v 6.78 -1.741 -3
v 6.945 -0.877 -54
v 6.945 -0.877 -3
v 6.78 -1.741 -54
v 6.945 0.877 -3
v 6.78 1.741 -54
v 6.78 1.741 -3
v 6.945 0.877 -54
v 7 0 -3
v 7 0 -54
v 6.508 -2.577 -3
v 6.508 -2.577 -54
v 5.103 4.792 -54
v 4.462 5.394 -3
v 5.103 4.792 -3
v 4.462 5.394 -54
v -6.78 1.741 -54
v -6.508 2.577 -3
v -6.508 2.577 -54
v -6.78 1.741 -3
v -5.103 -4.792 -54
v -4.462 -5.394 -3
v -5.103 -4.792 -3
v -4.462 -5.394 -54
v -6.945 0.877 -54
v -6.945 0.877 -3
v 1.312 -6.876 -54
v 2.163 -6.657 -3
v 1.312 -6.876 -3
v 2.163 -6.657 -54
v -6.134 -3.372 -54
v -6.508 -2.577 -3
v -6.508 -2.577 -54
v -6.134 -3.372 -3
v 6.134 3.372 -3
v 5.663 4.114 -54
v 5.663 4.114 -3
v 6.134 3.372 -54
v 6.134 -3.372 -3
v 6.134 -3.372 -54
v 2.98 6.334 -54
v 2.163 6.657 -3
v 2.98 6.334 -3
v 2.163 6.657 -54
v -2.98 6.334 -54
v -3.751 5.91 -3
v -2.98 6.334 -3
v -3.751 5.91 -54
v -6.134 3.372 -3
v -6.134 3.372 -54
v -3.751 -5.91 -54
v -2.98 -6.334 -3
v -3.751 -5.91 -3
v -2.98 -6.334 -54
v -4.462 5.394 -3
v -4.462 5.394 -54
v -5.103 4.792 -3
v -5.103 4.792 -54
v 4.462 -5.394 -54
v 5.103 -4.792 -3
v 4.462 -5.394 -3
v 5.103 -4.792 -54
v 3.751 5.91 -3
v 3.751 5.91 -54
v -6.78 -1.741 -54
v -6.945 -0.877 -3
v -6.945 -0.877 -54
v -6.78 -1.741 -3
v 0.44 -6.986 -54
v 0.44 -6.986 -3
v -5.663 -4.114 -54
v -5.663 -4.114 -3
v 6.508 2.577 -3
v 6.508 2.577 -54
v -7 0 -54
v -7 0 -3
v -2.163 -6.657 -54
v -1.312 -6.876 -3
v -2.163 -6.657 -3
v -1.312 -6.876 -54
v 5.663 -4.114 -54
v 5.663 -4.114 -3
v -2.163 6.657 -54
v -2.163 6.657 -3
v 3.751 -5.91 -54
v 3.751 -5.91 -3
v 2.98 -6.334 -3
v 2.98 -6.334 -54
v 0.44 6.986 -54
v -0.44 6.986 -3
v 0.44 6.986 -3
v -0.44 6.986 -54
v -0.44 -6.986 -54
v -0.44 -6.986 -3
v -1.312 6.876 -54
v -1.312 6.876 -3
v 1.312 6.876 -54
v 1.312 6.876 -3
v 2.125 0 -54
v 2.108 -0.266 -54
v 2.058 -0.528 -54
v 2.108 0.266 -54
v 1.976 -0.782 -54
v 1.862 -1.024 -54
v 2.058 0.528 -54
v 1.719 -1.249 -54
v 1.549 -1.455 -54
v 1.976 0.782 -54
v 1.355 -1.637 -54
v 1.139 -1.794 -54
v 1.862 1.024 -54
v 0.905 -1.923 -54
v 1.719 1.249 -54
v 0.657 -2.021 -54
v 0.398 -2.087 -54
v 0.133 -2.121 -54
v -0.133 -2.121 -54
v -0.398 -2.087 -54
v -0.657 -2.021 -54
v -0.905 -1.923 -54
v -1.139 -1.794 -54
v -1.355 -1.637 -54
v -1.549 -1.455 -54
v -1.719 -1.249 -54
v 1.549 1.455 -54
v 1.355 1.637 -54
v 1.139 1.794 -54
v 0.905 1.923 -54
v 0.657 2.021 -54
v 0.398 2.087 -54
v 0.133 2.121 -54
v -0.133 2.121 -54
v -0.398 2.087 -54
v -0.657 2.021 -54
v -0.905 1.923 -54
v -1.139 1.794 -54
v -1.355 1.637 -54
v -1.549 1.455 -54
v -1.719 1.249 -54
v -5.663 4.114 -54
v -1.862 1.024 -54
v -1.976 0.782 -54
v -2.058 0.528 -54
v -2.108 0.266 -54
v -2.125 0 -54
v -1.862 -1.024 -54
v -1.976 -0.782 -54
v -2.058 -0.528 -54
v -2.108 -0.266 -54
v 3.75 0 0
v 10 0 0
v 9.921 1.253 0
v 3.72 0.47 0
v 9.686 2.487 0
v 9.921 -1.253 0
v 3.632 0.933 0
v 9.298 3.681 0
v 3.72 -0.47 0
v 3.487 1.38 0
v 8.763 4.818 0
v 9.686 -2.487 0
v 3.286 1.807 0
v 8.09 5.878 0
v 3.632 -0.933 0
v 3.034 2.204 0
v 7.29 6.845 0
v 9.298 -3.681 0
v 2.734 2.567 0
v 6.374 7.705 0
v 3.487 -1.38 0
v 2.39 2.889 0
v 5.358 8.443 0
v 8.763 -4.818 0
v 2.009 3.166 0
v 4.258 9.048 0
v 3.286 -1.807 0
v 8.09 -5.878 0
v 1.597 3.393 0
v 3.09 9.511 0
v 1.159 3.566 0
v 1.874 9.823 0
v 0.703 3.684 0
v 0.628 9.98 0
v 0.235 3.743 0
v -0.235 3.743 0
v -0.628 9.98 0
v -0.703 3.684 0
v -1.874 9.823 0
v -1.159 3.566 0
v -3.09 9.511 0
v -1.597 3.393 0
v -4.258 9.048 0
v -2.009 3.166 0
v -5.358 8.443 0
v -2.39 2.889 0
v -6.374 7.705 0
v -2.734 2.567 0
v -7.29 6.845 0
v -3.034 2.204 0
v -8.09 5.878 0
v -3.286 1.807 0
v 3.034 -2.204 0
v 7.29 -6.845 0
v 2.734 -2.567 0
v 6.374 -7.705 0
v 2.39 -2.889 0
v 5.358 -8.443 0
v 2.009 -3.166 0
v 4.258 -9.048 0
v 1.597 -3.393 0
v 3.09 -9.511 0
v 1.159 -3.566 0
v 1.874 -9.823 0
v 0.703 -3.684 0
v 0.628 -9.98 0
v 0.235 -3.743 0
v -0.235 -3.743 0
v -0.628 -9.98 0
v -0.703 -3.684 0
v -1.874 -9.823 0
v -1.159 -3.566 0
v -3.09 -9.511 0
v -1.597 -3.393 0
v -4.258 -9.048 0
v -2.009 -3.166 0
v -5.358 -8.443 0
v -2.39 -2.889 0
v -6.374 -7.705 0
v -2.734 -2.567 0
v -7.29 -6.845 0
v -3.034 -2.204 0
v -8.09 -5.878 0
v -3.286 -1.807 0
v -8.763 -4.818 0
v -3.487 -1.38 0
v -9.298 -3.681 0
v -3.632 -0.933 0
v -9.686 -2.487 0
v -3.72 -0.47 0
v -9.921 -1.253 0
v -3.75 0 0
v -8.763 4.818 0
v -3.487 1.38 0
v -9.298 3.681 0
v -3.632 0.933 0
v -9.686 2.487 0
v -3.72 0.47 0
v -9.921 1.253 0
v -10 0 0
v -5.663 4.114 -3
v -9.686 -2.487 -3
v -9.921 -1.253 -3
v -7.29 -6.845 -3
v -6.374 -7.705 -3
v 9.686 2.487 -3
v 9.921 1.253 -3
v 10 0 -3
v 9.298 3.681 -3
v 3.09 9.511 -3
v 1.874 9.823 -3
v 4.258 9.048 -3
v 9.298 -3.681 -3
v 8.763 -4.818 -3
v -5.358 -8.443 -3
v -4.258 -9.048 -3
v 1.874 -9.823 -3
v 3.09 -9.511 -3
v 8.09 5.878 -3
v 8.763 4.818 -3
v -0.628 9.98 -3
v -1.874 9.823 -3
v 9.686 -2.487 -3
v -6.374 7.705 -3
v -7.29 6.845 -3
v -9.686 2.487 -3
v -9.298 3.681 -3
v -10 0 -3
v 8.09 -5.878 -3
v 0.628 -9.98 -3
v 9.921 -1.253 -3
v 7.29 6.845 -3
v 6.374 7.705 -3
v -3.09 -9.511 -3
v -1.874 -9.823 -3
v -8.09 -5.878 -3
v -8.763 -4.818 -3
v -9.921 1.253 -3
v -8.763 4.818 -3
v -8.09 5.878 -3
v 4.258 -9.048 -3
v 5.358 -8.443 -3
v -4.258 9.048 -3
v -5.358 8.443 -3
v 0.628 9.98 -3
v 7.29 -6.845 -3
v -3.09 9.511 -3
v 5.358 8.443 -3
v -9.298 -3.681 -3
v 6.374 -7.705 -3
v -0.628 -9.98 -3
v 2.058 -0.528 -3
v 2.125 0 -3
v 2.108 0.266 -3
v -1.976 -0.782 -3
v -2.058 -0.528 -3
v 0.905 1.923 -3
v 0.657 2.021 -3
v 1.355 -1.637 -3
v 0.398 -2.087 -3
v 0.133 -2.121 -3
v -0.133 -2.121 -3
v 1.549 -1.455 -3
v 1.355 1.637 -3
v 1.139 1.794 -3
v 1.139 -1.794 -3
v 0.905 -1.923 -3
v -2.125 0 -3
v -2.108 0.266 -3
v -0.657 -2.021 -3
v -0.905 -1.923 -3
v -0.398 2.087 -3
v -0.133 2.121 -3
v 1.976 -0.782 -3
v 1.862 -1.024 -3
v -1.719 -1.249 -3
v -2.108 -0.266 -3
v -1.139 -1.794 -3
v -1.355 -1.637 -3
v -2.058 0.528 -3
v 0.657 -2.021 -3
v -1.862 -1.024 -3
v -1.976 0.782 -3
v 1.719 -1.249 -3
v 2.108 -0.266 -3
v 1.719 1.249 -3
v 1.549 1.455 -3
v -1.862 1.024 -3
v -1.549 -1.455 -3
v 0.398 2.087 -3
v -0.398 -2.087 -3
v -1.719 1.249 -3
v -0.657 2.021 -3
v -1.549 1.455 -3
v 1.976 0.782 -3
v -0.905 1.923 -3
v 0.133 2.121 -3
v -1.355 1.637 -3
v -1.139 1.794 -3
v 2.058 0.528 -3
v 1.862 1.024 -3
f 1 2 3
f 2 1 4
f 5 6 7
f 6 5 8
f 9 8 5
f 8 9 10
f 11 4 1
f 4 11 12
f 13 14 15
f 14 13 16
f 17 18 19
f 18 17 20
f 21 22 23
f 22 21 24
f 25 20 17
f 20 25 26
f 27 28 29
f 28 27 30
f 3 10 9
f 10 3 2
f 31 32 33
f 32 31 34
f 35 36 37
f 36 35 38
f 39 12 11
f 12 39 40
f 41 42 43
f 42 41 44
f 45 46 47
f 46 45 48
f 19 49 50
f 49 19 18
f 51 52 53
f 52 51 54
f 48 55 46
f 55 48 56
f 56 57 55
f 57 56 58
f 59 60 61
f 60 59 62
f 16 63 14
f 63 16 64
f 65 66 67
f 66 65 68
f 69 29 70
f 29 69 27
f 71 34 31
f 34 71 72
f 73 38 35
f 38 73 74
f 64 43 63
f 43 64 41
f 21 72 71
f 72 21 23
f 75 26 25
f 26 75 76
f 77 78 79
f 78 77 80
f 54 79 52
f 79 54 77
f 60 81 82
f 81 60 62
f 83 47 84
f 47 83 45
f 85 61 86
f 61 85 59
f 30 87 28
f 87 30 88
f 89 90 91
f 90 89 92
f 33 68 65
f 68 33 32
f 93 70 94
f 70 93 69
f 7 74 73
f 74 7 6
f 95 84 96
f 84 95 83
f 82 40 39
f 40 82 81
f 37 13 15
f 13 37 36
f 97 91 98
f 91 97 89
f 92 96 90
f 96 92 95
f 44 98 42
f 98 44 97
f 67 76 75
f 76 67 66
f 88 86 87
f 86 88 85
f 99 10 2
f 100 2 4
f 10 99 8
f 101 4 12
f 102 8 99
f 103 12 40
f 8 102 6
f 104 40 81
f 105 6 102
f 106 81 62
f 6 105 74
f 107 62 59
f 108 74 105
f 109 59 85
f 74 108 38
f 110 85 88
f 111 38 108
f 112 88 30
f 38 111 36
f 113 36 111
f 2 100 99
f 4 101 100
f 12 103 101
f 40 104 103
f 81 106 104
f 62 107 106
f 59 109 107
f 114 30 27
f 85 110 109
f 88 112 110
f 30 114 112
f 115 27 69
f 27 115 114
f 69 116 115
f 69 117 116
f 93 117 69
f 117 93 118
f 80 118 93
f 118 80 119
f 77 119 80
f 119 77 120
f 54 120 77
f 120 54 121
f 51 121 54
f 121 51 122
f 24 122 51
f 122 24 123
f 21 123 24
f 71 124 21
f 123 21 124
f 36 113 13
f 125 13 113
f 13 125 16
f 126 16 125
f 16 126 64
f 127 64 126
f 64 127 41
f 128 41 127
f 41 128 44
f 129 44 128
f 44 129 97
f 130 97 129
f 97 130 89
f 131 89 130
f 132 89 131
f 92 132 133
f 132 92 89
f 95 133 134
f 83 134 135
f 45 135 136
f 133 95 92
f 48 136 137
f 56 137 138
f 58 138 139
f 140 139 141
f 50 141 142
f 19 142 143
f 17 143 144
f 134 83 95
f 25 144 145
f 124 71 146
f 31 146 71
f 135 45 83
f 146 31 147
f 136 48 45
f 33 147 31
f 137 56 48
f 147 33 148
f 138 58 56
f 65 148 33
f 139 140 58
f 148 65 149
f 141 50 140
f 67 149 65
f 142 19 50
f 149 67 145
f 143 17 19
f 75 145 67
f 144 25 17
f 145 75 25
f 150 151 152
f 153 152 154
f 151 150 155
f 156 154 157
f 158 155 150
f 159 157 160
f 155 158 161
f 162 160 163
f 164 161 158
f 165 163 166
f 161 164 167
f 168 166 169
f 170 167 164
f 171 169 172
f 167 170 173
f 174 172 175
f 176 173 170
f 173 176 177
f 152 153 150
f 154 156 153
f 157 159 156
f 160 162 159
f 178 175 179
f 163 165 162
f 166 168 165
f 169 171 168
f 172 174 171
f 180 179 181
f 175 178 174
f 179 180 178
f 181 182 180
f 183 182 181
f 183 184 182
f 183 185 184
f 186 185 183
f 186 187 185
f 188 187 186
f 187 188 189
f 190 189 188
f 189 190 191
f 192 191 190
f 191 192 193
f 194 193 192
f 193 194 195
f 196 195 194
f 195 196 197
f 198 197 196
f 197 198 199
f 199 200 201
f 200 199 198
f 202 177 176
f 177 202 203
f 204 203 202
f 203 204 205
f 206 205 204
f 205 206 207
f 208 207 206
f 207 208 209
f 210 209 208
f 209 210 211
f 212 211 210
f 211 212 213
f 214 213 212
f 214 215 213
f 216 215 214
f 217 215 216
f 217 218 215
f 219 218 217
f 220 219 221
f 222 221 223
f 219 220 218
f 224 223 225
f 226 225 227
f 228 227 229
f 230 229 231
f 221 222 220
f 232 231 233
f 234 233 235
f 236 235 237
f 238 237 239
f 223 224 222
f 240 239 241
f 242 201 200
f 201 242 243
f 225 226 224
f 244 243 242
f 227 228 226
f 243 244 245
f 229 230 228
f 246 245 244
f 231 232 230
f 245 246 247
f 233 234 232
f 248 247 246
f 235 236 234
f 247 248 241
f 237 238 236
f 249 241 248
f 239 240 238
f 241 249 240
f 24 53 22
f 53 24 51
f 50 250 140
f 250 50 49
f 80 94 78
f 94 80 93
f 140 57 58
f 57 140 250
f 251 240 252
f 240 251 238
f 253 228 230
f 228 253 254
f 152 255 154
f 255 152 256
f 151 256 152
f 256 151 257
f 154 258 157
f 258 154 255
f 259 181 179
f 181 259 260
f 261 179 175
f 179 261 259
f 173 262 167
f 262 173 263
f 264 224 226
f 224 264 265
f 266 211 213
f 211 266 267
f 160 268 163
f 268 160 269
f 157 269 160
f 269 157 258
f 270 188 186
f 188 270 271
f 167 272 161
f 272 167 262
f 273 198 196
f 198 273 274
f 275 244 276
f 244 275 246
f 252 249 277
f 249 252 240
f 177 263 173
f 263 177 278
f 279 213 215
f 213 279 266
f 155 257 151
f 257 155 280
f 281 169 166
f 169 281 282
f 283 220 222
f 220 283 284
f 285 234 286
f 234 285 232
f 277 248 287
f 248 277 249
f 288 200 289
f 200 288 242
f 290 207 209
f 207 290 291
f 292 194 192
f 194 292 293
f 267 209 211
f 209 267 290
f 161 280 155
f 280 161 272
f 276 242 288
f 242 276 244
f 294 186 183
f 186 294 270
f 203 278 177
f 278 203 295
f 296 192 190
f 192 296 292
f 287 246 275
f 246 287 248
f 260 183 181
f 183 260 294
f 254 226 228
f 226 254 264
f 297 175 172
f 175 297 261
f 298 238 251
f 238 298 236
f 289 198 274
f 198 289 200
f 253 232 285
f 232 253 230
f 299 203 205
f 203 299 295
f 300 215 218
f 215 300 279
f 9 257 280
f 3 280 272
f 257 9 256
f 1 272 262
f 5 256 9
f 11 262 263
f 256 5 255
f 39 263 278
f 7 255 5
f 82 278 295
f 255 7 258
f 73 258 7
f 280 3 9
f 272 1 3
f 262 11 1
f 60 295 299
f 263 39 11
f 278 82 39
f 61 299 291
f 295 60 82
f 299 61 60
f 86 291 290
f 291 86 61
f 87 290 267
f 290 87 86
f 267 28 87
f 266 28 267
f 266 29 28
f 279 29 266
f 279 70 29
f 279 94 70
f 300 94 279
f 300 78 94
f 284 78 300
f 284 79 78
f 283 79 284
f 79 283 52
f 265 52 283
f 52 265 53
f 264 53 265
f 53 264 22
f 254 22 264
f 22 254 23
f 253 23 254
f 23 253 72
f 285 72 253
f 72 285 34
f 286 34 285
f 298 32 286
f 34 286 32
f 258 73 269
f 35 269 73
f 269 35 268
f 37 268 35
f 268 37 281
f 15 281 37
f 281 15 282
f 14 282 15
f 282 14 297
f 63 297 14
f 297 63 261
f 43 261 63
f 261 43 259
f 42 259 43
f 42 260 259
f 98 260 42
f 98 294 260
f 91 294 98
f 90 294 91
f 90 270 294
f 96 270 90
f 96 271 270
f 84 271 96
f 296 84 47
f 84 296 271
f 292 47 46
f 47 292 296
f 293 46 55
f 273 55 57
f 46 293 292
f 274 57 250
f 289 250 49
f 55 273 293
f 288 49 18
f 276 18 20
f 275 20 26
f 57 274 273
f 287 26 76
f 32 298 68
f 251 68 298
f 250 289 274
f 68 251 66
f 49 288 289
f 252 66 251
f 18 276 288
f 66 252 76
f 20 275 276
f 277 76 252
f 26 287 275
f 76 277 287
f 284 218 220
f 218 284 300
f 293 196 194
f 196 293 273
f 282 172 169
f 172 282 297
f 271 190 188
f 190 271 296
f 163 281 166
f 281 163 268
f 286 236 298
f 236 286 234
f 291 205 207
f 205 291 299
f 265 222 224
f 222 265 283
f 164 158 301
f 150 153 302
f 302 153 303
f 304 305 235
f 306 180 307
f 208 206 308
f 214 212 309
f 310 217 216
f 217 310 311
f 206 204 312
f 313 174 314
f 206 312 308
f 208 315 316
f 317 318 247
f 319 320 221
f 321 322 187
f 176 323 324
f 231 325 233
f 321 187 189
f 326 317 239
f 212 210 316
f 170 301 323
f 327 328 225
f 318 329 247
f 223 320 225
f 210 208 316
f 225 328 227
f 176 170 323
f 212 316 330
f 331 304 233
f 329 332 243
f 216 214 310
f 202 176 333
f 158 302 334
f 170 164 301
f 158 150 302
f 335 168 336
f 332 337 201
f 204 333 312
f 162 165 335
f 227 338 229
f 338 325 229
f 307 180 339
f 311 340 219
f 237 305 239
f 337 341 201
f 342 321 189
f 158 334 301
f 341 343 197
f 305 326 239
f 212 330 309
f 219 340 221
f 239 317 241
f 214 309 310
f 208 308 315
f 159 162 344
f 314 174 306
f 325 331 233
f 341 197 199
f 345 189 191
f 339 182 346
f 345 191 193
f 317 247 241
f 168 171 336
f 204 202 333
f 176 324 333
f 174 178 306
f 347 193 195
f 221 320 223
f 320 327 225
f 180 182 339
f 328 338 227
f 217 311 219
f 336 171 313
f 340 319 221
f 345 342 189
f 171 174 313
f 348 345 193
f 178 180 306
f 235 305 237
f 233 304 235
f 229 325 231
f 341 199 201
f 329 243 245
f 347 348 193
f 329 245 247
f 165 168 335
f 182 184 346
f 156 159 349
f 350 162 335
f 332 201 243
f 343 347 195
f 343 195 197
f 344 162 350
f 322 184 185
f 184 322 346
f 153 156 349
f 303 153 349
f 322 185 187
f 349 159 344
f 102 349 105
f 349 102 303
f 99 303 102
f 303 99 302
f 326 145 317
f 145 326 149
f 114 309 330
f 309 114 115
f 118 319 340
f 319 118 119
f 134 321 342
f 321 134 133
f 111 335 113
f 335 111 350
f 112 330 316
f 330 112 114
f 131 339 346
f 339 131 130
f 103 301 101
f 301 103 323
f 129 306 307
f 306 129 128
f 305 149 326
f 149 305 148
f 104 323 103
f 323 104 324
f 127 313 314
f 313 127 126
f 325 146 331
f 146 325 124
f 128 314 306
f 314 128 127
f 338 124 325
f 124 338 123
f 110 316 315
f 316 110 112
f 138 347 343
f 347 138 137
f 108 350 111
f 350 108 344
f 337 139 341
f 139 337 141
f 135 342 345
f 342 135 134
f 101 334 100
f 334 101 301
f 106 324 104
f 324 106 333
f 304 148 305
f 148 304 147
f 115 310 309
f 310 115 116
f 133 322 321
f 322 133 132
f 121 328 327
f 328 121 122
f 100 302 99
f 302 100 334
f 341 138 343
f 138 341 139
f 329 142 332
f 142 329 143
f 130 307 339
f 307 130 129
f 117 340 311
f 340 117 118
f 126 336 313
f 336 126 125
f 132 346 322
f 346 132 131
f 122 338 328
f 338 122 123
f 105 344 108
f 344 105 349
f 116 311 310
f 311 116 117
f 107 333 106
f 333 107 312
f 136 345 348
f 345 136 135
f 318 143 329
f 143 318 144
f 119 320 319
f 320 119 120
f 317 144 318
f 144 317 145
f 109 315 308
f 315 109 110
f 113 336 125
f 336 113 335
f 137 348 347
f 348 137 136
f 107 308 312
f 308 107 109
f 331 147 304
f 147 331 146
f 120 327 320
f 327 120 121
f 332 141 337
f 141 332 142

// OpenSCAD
$fn = 50;


difference() {
	union() {
		translate(v = [0, 0, -54.0000000000]) {
			cylinder(h = 54, r = 7.0000000000);
		}
		translate(v = [0, 0, -3.0000000000]) {
			cylinder(h = 3, r = 10.0000000000);
		}
	}
	union() {
		translate(v = [0, 0, 0]) {
			rotate(a = [0, 0, 0]) {
				difference() {
					union() {
						#translate(v = [0, 0, -54.0000000000]) {
							cylinder(h = 54, r = 2.0000000000);
						}
						#translate(v = [0, 0, -3]) {
							cylinder(h = 3, r = 7.0000000000, r1 = 2.1250000000, r2 = 3.7500000000);
						}
						#translate(v = [0, 0, -54.0000000000]) {
							cylinder(h = 54, r = 2.1250000000);
						}
						#translate(v = [0, 0, -54.0000000000]) {
							cylinder(h = 54, r = 2.0000000000);
						}
					}
					union();
				}
			}
		}
	}
}
